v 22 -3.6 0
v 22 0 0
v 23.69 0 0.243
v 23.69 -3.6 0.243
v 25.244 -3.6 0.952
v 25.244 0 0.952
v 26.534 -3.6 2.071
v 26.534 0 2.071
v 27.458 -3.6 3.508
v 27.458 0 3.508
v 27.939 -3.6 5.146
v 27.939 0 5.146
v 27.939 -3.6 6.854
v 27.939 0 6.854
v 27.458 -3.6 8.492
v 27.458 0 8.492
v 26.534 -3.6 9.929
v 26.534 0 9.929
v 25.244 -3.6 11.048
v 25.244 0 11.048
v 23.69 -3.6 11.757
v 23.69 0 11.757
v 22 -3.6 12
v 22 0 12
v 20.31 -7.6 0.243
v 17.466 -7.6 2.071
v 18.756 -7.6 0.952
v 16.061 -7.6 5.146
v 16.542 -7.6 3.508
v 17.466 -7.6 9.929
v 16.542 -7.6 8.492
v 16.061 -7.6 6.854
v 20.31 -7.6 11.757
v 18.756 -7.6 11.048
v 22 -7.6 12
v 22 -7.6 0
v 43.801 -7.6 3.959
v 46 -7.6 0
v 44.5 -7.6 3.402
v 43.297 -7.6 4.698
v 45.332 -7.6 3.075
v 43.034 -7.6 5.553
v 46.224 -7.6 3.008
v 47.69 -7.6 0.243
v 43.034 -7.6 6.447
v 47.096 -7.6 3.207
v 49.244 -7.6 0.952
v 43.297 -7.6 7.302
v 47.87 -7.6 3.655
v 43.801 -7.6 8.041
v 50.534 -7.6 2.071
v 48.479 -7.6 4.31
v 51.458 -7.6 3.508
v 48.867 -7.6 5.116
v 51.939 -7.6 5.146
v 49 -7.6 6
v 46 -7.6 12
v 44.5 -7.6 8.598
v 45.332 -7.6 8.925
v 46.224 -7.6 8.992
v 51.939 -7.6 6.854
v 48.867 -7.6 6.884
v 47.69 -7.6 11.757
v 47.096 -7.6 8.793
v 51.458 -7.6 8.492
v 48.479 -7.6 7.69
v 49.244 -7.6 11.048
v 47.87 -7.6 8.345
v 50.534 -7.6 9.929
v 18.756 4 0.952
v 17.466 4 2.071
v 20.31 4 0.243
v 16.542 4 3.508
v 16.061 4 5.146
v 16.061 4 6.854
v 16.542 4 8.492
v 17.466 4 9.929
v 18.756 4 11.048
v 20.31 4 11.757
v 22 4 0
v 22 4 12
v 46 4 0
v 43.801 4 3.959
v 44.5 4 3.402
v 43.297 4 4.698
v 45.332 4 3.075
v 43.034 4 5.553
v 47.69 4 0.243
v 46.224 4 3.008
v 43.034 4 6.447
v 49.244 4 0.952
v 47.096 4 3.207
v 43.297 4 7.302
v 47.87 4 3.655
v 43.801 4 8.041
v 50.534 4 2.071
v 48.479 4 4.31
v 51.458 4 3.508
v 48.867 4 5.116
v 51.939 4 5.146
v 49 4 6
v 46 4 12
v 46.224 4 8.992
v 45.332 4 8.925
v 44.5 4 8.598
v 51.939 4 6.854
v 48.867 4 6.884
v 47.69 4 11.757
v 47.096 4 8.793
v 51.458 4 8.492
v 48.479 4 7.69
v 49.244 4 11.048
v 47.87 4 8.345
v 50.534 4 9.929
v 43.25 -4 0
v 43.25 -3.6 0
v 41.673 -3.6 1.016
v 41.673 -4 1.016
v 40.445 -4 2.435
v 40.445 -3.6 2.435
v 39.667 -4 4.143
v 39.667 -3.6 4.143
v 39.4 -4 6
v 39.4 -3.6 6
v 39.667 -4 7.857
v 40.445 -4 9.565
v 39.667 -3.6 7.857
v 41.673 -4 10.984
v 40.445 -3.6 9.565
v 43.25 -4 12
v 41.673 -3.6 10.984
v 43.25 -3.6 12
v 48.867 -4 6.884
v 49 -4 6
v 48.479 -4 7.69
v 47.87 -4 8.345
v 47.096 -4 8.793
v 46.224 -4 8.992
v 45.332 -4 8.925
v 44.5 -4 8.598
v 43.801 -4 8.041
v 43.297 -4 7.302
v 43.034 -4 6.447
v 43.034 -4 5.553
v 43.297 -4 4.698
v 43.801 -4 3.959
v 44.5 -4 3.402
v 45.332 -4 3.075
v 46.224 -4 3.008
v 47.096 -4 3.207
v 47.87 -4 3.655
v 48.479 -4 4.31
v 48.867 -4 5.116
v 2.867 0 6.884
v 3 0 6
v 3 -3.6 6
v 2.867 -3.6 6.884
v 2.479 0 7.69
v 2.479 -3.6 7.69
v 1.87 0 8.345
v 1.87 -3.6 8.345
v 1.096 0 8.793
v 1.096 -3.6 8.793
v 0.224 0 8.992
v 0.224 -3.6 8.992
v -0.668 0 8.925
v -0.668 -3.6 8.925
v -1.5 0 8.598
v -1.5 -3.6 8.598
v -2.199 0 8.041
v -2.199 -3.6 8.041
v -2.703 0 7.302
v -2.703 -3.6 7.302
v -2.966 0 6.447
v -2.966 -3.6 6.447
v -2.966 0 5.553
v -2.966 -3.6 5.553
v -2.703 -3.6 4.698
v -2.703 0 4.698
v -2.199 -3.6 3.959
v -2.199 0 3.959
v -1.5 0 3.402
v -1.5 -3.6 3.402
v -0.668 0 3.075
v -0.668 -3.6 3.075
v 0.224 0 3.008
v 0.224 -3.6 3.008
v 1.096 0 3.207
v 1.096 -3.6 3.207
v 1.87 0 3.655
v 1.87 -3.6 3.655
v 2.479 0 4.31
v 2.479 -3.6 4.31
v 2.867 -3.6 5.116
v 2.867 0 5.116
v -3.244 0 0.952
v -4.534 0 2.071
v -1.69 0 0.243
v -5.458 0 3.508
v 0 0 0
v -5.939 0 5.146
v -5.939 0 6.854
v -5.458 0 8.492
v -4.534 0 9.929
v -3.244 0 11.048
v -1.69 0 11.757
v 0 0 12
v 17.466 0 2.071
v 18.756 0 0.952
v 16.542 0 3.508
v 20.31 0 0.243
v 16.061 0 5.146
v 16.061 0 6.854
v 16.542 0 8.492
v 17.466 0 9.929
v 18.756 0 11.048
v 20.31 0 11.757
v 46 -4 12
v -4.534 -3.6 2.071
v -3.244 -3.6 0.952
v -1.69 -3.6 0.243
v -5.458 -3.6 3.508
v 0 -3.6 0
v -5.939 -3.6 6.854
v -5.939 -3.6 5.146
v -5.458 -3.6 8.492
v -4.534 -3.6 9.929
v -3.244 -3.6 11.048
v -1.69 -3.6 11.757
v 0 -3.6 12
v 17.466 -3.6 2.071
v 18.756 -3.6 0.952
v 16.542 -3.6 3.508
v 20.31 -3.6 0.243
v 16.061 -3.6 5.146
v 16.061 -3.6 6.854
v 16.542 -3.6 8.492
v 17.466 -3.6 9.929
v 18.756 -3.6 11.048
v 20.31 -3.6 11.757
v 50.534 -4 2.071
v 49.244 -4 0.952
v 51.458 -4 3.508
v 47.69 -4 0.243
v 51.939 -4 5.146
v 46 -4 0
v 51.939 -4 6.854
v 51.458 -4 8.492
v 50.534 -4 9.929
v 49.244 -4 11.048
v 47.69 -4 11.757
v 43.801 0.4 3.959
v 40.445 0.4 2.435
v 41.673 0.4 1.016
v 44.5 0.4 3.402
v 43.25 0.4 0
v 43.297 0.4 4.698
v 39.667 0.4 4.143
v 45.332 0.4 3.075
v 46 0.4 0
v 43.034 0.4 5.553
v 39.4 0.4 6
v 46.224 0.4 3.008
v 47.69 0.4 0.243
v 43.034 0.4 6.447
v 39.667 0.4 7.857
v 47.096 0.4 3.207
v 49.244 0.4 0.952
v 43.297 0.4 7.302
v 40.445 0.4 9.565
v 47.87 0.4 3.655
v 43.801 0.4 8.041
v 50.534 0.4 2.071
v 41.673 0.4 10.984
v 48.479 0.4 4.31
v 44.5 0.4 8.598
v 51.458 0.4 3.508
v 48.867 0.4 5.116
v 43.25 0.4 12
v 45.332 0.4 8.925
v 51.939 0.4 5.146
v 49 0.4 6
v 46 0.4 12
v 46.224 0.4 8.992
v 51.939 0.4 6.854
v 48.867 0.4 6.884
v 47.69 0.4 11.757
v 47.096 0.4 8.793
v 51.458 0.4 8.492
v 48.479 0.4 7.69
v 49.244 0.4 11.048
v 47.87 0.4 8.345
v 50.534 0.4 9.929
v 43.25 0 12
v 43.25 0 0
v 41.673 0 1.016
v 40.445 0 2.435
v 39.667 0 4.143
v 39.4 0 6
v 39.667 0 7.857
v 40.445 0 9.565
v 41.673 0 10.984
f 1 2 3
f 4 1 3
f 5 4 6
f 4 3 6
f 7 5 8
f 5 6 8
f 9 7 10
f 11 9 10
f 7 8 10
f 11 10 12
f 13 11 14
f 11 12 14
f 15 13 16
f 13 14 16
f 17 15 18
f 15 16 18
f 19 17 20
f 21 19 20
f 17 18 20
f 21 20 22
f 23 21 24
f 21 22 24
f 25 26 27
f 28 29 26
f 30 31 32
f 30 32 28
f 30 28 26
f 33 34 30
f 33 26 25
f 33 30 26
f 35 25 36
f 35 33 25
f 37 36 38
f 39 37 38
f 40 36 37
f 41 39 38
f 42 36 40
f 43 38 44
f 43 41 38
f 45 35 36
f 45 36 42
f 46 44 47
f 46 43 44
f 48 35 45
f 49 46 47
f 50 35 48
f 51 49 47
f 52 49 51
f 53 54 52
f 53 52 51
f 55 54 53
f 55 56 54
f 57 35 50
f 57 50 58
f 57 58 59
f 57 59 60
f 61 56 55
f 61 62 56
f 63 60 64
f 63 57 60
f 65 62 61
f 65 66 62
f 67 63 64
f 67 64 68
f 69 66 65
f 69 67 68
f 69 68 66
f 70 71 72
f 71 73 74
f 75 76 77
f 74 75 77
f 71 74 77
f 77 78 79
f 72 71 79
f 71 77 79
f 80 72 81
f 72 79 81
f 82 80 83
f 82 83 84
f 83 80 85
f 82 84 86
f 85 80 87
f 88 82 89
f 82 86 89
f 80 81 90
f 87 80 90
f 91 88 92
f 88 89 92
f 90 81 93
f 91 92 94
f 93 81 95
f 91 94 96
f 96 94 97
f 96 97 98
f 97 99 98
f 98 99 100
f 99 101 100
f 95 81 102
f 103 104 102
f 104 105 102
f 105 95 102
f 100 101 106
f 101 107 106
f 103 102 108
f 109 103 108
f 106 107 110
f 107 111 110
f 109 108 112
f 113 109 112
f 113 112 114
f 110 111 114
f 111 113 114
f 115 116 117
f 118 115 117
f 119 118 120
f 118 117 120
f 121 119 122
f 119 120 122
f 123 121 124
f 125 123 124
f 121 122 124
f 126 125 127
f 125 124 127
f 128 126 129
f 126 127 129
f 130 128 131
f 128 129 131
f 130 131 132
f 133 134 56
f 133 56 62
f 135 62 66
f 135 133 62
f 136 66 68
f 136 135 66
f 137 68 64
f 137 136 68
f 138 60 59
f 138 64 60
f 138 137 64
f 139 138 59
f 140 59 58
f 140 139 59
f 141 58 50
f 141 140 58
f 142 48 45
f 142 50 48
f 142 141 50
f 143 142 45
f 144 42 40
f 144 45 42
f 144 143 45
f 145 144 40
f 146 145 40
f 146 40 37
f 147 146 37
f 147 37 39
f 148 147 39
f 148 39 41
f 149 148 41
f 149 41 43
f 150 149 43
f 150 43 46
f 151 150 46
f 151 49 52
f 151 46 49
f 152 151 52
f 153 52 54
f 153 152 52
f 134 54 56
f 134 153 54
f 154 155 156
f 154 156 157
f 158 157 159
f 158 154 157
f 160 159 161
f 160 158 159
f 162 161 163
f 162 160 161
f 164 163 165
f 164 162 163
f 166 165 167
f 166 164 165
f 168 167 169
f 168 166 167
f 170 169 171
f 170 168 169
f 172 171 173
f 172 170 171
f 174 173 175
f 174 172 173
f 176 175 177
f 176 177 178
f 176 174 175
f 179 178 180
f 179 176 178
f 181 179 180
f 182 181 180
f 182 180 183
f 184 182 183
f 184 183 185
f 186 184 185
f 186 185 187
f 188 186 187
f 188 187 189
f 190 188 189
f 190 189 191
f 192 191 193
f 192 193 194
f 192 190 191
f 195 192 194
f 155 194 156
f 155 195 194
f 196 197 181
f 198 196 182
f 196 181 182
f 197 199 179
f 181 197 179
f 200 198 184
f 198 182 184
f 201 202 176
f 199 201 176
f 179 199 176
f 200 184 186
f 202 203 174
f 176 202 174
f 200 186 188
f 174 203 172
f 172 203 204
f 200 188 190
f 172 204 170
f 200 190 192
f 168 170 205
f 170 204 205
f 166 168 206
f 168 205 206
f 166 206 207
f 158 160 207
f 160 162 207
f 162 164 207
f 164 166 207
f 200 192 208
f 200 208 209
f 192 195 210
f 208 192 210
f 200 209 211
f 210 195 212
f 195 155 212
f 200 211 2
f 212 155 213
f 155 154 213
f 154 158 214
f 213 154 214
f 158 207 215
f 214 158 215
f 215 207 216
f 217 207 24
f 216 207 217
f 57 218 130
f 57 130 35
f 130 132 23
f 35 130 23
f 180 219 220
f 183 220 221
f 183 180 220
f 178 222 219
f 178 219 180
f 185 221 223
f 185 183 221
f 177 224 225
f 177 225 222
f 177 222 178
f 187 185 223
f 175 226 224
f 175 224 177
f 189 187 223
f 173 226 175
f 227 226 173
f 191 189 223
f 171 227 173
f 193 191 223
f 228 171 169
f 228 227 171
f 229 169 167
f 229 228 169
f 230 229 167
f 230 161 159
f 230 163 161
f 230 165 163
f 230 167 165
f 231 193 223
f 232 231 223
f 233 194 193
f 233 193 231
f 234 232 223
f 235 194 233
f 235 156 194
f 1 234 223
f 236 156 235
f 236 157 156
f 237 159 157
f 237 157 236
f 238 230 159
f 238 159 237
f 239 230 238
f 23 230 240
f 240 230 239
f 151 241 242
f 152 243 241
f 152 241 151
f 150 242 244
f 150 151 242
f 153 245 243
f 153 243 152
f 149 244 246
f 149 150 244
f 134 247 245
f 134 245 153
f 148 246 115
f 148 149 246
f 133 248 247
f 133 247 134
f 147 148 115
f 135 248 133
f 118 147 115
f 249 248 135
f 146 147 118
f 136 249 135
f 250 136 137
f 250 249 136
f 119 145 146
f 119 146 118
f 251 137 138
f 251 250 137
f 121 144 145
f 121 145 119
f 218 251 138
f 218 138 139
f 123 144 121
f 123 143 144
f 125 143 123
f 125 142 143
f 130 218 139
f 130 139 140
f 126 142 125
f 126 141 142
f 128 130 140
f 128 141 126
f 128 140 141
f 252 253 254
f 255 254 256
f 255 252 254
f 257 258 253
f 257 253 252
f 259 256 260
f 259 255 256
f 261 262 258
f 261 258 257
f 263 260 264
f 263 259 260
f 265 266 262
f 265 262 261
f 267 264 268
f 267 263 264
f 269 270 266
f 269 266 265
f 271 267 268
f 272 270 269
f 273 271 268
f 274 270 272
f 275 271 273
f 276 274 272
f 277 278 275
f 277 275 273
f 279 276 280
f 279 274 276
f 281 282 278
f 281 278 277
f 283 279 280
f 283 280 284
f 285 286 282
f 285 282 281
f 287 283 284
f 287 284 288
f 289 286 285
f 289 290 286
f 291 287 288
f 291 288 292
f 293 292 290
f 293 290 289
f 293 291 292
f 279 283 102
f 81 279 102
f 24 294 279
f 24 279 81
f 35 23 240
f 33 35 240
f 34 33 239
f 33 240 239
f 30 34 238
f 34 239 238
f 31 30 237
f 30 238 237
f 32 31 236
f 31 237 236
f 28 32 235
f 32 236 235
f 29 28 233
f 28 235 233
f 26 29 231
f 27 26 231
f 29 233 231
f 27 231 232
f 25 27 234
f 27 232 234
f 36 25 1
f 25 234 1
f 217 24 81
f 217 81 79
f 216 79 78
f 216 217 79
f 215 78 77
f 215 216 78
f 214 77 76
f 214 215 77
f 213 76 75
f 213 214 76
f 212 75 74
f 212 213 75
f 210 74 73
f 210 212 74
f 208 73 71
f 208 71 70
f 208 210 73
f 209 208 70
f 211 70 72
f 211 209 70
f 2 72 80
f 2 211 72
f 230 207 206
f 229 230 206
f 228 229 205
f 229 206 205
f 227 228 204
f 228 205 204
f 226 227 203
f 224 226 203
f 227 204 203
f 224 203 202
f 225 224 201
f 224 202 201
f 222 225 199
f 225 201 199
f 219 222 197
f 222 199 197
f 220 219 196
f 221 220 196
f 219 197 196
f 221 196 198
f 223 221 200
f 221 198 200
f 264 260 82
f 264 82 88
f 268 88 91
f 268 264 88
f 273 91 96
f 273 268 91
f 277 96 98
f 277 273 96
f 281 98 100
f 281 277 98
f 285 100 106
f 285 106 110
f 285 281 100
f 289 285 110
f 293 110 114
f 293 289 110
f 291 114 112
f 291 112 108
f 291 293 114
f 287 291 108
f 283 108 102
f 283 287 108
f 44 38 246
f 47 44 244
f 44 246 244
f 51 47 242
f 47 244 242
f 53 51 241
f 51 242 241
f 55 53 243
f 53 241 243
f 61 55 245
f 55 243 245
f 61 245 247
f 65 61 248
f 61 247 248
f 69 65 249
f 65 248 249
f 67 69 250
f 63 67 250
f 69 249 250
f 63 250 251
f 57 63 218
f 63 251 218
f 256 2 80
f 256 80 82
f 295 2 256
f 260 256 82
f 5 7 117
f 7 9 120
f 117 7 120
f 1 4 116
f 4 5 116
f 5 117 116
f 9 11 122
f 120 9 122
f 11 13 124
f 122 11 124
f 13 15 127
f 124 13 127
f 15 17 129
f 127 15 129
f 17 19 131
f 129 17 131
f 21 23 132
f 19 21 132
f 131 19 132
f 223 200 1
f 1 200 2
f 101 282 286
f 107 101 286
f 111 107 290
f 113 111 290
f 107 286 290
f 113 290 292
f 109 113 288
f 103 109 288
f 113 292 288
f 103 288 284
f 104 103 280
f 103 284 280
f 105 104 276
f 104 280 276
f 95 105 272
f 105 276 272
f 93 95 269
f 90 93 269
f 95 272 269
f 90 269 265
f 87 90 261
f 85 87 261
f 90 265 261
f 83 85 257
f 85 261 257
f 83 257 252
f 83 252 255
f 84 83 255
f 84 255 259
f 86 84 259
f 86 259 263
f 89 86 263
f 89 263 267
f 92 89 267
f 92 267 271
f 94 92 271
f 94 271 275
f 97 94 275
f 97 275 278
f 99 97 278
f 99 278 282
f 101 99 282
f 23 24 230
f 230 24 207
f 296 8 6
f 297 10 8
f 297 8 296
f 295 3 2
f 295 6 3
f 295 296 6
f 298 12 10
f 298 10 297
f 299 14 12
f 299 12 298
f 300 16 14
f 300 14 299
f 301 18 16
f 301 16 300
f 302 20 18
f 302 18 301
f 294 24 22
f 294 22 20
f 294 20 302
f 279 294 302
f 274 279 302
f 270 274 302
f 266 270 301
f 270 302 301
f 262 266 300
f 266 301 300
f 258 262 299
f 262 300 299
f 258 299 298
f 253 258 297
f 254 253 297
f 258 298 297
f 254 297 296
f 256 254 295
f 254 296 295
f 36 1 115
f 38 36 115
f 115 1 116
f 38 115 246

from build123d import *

# Parameters (mm, degrees)
F0_R           = 3
F1_DEPTH       = 3.6
F3_DEPTH       = 4
F5_DEPTH       = 4
F7_R           = 6.6
F9_DEPTH       = 0.4
F8_R           = 6.6
F10_DEPTH      = 0.4
F6_R           = 3
F11_DEPTH      = 7.601
F11_DEPTH_BACK = 4.001


with BuildPart() as f1:
    # F0 (on Front) → F1 (new body)
    with BuildSketch(Plane.XZ):
        with BuildLine():
            Line((22, 12), (0, 12))
            ThreePointArc((0, 12), (-6, 6), (0, 0))
            Line((0, 0), (22, 0))
            ThreePointArc((22, 0), (28, 6), (22, 12))
        make_face()
        with Locations((0, 6)):
            Circle(F0_R, mode=Mode.SUBTRACT)
    extrude(amount=F1_DEPTH)

    # F2 (on Front) → F3 (join)
    with BuildSketch(Plane.XZ):
        with BuildLine():
            Line((46, 12), (22, 12))
            ThreePointArc((22, 12), (16, 6), (22, 0))
            Line((22, 0), (46, 0))
            ThreePointArc((46, 0), (52, 6), (46, 12))
        make_face()
    extrude(amount=-F3_DEPTH)

    # F4 (on face) → F5 (join)
    with BuildSketch(Plane.XZ.offset(3.6)):
        with BuildLine():
            Line((46, 12), (22, 12))
            ThreePointArc((22, 12), (16, 6), (22, 0))
            Line((22, 0), (46, 0))
            ThreePointArc((46, 0), (52, 6), (46, 12))
        make_face()
    extrude(amount=F5_DEPTH)

    # F7 (on face) → F9 (cut)
    with BuildSketch(Plane(origin=(0, -3.6, 0), x_dir=(-1, 0, 0), z_dir=(0, 1, 0))):
        with Locations((-46, 6)):
            Circle(F7_R)
    extrude(amount=-F9_DEPTH, mode=Mode.SUBTRACT)

    # F8 (on face) → F10 (cut)
    with BuildSketch(Plane.XZ):
        with Locations((46, 6)):
            Circle(F8_R)
    extrude(amount=-F10_DEPTH, mode=Mode.SUBTRACT)

    # F6 (on face) → F11 (cut, two sides)
    with BuildSketch(Plane.XZ) as f11_sk:
        with Locations((46, 6)):
            Circle(F6_R)
    extrude(amount=F11_DEPTH, mode=Mode.SUBTRACT)
    extrude(f11_sk.sketch, amount=-F11_DEPTH_BACK, mode=Mode.SUBTRACT)


solid = f1.part
